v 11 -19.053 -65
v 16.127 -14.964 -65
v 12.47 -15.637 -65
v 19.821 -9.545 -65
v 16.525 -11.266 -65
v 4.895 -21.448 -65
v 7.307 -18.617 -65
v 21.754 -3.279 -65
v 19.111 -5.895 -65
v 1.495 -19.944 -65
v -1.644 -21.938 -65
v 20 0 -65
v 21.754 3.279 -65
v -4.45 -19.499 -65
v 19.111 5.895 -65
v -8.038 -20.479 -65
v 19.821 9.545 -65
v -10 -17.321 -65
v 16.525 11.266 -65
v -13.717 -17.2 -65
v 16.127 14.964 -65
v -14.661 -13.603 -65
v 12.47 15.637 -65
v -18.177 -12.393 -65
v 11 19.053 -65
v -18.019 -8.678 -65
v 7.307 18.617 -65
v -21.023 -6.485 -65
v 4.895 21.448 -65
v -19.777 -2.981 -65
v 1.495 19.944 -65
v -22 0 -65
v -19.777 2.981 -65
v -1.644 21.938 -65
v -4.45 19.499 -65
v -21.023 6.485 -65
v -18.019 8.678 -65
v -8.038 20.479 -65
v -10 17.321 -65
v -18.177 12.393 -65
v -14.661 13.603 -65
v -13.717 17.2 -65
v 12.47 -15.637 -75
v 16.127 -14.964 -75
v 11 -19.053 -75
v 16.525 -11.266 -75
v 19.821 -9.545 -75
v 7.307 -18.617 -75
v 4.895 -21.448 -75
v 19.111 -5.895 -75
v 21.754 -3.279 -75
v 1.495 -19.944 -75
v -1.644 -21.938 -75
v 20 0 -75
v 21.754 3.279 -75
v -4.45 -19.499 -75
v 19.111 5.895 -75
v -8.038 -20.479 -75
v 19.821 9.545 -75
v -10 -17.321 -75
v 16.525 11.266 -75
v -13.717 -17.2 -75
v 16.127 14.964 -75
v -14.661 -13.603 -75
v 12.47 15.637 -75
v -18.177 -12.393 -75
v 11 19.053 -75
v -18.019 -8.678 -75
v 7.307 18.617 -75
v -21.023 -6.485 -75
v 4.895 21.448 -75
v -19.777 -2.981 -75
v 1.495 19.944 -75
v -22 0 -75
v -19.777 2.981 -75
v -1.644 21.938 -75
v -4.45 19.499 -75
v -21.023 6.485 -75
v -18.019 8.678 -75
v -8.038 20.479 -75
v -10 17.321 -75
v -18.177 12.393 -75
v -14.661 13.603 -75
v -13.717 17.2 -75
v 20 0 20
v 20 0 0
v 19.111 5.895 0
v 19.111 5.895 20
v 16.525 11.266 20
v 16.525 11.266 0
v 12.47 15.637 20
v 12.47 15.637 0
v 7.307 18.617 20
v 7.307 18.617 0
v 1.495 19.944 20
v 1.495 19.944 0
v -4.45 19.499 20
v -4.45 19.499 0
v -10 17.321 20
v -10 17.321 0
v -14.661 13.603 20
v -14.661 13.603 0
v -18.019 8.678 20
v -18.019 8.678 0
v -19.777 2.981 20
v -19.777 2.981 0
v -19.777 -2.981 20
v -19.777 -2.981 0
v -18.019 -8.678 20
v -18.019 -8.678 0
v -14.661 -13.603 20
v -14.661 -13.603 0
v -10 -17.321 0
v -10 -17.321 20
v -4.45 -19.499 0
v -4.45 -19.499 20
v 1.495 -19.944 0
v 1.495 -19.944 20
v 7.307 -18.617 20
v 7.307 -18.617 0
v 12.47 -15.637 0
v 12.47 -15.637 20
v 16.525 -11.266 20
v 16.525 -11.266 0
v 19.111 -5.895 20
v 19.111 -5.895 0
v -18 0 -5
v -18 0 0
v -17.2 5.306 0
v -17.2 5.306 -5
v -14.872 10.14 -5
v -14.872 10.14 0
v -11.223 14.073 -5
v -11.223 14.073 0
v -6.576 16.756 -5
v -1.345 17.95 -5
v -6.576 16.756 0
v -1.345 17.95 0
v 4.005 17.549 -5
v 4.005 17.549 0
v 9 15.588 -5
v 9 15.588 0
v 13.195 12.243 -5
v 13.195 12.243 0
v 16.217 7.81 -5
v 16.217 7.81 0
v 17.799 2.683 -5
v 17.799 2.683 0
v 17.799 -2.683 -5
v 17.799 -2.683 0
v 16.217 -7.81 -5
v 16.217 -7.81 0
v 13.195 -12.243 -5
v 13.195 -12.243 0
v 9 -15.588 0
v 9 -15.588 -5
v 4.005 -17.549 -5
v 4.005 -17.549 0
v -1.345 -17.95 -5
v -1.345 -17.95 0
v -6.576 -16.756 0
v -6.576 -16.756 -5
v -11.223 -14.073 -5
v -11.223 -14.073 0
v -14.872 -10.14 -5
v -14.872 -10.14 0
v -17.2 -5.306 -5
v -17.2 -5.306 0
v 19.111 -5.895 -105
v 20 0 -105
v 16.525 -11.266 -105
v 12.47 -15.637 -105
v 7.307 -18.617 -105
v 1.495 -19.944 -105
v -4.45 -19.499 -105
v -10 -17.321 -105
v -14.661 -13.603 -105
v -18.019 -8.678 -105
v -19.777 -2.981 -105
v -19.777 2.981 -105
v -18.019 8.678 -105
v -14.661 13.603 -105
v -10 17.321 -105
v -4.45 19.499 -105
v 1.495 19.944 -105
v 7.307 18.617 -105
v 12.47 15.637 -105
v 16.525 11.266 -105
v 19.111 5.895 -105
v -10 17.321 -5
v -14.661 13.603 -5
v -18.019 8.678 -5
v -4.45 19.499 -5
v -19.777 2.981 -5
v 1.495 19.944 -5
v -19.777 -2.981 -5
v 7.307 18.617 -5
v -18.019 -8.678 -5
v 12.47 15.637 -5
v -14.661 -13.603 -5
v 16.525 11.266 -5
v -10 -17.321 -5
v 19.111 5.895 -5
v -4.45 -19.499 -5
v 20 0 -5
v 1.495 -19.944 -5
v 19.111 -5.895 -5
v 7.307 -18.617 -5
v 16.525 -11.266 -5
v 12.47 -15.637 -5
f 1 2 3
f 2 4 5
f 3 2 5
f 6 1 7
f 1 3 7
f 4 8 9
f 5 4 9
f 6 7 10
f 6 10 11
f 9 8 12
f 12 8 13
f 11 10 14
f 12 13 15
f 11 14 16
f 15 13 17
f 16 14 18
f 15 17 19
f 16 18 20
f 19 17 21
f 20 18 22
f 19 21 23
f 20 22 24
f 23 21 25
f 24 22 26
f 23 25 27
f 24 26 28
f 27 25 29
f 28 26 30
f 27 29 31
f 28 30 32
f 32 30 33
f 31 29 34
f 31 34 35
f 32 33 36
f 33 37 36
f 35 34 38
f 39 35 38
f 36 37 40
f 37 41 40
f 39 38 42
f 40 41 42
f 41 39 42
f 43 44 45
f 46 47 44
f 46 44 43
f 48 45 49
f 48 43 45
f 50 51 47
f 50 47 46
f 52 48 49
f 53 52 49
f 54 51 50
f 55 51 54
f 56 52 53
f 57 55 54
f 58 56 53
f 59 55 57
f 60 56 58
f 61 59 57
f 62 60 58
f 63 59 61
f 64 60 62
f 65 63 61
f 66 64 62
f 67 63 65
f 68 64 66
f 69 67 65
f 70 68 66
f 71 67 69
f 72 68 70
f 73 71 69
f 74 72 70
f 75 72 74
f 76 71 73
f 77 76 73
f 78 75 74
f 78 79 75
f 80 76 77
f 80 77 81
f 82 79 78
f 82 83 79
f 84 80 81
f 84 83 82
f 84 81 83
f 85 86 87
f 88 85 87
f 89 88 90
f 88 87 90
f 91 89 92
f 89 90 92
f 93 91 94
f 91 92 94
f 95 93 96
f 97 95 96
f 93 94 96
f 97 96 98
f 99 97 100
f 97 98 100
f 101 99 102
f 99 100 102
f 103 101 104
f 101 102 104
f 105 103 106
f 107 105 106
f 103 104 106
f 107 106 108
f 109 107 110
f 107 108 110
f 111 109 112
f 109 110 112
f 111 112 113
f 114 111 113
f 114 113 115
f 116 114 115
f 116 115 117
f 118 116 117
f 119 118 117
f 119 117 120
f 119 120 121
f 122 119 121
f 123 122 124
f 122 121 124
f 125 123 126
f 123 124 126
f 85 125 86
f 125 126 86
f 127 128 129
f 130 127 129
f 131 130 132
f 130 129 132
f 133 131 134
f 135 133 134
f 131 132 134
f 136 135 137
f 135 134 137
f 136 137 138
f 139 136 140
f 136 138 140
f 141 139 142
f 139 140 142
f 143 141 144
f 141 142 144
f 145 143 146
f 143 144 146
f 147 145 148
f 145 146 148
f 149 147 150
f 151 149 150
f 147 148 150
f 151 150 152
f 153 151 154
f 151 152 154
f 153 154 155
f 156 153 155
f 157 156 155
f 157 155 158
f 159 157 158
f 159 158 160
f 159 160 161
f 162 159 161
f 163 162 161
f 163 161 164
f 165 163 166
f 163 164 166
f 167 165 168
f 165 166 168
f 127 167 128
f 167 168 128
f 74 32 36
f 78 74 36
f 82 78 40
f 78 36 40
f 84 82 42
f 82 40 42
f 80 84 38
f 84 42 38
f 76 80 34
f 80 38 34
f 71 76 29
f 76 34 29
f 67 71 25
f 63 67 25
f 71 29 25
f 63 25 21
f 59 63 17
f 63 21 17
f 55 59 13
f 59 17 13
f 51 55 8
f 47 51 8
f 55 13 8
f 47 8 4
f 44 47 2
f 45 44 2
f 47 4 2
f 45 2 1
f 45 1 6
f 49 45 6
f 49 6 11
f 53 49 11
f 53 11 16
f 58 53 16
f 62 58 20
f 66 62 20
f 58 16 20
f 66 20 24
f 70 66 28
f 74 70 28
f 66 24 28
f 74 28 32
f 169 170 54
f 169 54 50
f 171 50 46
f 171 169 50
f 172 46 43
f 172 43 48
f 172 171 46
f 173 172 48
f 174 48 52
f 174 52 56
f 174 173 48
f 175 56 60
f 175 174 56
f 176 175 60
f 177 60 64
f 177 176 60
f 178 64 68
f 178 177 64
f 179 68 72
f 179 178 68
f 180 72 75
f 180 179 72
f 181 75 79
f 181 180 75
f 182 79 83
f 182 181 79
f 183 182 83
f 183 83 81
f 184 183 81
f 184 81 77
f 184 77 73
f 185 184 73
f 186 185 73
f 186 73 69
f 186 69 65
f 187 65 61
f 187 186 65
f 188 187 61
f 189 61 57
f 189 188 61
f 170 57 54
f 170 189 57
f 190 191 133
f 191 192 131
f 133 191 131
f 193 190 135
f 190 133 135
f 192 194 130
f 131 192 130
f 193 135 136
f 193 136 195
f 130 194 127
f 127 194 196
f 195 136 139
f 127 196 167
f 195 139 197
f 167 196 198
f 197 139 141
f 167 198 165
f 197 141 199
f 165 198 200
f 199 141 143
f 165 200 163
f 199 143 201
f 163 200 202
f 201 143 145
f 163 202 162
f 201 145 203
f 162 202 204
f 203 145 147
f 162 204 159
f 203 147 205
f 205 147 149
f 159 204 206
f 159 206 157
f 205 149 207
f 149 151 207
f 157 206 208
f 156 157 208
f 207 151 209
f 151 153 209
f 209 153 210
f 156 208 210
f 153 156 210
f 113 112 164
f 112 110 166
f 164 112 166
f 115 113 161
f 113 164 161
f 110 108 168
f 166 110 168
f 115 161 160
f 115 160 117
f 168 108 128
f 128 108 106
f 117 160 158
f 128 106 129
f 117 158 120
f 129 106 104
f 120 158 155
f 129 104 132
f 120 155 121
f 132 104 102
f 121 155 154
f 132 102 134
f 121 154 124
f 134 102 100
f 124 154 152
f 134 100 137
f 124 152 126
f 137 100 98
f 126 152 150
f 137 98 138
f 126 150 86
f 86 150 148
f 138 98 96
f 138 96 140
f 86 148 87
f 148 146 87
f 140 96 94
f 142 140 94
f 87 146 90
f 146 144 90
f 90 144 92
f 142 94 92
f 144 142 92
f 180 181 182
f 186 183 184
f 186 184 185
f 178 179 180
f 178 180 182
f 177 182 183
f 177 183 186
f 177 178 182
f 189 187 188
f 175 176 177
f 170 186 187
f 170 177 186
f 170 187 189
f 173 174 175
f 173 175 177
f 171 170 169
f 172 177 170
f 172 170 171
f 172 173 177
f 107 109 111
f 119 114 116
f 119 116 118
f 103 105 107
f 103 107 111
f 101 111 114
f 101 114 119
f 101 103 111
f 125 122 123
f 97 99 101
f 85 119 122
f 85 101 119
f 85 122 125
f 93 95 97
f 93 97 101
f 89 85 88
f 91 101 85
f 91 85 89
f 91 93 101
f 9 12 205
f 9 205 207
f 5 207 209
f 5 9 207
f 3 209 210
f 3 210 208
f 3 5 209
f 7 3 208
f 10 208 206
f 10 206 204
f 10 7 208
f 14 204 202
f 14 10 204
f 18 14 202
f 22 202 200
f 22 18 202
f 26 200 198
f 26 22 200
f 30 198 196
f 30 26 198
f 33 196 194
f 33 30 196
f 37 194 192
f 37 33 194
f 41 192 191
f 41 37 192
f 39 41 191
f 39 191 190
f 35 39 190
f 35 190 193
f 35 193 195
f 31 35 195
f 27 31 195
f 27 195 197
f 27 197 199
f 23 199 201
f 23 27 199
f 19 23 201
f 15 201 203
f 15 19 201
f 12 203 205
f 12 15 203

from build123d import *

# Parameters (mm, degrees)
SKETCH_1_R      = 20
EXTRUDE_1_DEPTH = 20
SKETCH_2_R      = 18
EXTRUDE_2_DEPTH = 5
EXTRUDE_START   = 60
SKETCH_3_R      = 20
EXTRUDE_3_DEPTH = 60
SKETCH_4_R      = 22
EXTRUDE_4_DEPTH = 10
EXTRUDE_START_2 = 30
SKETCH_5_R      = 20
EXTRUDE_5_DEPTH = 30


with BuildPart() as part:
    # 草图1 → 凸台-拉伸1 (new body)
    with BuildSketch(Plane.XY):
        Circle(SKETCH_1_R)
    extrude(amount=EXTRUDE_1_DEPTH)

    # 草图2 → 凸台-拉伸2 (add)
    with BuildSketch(Plane(origin=(0, 0, 0), x_dir=(-1, 0, 0), z_dir=(0, 0, -1))):
        Circle(SKETCH_2_R)
    extrude(amount=EXTRUDE_2_DEPTH)

    # 草图3 → 凸台-拉伸3 (add)
    with BuildSketch(Plane(origin=(0, 0, -5), x_dir=(-1, 0, 0), z_dir=(0, 0, -1)).offset(EXTRUDE_START)):
        with Locations(Location((0, 0, 0), (0, 0, 180))):
            Circle(SKETCH_3_R)
    extrude(amount=-EXTRUDE_3_DEPTH)

    # 草图4 → 凸台-拉伸4 (add)
    with BuildSketch(Plane(origin=(0, 0, -65), x_dir=(-1, 0, 0), z_dir=(0, 0, -1))):
        Circle(SKETCH_4_R)
    extrude(amount=EXTRUDE_4_DEPTH)

    # 草图5 → 凸台-拉伸5 (add)
    with BuildSketch(Plane(origin=(0, 0, -75), x_dir=(-1, 0, 0), z_dir=(0, 0, -1)).offset(EXTRUDE_START_2)):
        with Locations(Location((0, 0, 0), (0, 0, 180))):
            Circle(SKETCH_5_R)
    extrude(amount=-EXTRUDE_5_DEPTH)


solid = part.part
